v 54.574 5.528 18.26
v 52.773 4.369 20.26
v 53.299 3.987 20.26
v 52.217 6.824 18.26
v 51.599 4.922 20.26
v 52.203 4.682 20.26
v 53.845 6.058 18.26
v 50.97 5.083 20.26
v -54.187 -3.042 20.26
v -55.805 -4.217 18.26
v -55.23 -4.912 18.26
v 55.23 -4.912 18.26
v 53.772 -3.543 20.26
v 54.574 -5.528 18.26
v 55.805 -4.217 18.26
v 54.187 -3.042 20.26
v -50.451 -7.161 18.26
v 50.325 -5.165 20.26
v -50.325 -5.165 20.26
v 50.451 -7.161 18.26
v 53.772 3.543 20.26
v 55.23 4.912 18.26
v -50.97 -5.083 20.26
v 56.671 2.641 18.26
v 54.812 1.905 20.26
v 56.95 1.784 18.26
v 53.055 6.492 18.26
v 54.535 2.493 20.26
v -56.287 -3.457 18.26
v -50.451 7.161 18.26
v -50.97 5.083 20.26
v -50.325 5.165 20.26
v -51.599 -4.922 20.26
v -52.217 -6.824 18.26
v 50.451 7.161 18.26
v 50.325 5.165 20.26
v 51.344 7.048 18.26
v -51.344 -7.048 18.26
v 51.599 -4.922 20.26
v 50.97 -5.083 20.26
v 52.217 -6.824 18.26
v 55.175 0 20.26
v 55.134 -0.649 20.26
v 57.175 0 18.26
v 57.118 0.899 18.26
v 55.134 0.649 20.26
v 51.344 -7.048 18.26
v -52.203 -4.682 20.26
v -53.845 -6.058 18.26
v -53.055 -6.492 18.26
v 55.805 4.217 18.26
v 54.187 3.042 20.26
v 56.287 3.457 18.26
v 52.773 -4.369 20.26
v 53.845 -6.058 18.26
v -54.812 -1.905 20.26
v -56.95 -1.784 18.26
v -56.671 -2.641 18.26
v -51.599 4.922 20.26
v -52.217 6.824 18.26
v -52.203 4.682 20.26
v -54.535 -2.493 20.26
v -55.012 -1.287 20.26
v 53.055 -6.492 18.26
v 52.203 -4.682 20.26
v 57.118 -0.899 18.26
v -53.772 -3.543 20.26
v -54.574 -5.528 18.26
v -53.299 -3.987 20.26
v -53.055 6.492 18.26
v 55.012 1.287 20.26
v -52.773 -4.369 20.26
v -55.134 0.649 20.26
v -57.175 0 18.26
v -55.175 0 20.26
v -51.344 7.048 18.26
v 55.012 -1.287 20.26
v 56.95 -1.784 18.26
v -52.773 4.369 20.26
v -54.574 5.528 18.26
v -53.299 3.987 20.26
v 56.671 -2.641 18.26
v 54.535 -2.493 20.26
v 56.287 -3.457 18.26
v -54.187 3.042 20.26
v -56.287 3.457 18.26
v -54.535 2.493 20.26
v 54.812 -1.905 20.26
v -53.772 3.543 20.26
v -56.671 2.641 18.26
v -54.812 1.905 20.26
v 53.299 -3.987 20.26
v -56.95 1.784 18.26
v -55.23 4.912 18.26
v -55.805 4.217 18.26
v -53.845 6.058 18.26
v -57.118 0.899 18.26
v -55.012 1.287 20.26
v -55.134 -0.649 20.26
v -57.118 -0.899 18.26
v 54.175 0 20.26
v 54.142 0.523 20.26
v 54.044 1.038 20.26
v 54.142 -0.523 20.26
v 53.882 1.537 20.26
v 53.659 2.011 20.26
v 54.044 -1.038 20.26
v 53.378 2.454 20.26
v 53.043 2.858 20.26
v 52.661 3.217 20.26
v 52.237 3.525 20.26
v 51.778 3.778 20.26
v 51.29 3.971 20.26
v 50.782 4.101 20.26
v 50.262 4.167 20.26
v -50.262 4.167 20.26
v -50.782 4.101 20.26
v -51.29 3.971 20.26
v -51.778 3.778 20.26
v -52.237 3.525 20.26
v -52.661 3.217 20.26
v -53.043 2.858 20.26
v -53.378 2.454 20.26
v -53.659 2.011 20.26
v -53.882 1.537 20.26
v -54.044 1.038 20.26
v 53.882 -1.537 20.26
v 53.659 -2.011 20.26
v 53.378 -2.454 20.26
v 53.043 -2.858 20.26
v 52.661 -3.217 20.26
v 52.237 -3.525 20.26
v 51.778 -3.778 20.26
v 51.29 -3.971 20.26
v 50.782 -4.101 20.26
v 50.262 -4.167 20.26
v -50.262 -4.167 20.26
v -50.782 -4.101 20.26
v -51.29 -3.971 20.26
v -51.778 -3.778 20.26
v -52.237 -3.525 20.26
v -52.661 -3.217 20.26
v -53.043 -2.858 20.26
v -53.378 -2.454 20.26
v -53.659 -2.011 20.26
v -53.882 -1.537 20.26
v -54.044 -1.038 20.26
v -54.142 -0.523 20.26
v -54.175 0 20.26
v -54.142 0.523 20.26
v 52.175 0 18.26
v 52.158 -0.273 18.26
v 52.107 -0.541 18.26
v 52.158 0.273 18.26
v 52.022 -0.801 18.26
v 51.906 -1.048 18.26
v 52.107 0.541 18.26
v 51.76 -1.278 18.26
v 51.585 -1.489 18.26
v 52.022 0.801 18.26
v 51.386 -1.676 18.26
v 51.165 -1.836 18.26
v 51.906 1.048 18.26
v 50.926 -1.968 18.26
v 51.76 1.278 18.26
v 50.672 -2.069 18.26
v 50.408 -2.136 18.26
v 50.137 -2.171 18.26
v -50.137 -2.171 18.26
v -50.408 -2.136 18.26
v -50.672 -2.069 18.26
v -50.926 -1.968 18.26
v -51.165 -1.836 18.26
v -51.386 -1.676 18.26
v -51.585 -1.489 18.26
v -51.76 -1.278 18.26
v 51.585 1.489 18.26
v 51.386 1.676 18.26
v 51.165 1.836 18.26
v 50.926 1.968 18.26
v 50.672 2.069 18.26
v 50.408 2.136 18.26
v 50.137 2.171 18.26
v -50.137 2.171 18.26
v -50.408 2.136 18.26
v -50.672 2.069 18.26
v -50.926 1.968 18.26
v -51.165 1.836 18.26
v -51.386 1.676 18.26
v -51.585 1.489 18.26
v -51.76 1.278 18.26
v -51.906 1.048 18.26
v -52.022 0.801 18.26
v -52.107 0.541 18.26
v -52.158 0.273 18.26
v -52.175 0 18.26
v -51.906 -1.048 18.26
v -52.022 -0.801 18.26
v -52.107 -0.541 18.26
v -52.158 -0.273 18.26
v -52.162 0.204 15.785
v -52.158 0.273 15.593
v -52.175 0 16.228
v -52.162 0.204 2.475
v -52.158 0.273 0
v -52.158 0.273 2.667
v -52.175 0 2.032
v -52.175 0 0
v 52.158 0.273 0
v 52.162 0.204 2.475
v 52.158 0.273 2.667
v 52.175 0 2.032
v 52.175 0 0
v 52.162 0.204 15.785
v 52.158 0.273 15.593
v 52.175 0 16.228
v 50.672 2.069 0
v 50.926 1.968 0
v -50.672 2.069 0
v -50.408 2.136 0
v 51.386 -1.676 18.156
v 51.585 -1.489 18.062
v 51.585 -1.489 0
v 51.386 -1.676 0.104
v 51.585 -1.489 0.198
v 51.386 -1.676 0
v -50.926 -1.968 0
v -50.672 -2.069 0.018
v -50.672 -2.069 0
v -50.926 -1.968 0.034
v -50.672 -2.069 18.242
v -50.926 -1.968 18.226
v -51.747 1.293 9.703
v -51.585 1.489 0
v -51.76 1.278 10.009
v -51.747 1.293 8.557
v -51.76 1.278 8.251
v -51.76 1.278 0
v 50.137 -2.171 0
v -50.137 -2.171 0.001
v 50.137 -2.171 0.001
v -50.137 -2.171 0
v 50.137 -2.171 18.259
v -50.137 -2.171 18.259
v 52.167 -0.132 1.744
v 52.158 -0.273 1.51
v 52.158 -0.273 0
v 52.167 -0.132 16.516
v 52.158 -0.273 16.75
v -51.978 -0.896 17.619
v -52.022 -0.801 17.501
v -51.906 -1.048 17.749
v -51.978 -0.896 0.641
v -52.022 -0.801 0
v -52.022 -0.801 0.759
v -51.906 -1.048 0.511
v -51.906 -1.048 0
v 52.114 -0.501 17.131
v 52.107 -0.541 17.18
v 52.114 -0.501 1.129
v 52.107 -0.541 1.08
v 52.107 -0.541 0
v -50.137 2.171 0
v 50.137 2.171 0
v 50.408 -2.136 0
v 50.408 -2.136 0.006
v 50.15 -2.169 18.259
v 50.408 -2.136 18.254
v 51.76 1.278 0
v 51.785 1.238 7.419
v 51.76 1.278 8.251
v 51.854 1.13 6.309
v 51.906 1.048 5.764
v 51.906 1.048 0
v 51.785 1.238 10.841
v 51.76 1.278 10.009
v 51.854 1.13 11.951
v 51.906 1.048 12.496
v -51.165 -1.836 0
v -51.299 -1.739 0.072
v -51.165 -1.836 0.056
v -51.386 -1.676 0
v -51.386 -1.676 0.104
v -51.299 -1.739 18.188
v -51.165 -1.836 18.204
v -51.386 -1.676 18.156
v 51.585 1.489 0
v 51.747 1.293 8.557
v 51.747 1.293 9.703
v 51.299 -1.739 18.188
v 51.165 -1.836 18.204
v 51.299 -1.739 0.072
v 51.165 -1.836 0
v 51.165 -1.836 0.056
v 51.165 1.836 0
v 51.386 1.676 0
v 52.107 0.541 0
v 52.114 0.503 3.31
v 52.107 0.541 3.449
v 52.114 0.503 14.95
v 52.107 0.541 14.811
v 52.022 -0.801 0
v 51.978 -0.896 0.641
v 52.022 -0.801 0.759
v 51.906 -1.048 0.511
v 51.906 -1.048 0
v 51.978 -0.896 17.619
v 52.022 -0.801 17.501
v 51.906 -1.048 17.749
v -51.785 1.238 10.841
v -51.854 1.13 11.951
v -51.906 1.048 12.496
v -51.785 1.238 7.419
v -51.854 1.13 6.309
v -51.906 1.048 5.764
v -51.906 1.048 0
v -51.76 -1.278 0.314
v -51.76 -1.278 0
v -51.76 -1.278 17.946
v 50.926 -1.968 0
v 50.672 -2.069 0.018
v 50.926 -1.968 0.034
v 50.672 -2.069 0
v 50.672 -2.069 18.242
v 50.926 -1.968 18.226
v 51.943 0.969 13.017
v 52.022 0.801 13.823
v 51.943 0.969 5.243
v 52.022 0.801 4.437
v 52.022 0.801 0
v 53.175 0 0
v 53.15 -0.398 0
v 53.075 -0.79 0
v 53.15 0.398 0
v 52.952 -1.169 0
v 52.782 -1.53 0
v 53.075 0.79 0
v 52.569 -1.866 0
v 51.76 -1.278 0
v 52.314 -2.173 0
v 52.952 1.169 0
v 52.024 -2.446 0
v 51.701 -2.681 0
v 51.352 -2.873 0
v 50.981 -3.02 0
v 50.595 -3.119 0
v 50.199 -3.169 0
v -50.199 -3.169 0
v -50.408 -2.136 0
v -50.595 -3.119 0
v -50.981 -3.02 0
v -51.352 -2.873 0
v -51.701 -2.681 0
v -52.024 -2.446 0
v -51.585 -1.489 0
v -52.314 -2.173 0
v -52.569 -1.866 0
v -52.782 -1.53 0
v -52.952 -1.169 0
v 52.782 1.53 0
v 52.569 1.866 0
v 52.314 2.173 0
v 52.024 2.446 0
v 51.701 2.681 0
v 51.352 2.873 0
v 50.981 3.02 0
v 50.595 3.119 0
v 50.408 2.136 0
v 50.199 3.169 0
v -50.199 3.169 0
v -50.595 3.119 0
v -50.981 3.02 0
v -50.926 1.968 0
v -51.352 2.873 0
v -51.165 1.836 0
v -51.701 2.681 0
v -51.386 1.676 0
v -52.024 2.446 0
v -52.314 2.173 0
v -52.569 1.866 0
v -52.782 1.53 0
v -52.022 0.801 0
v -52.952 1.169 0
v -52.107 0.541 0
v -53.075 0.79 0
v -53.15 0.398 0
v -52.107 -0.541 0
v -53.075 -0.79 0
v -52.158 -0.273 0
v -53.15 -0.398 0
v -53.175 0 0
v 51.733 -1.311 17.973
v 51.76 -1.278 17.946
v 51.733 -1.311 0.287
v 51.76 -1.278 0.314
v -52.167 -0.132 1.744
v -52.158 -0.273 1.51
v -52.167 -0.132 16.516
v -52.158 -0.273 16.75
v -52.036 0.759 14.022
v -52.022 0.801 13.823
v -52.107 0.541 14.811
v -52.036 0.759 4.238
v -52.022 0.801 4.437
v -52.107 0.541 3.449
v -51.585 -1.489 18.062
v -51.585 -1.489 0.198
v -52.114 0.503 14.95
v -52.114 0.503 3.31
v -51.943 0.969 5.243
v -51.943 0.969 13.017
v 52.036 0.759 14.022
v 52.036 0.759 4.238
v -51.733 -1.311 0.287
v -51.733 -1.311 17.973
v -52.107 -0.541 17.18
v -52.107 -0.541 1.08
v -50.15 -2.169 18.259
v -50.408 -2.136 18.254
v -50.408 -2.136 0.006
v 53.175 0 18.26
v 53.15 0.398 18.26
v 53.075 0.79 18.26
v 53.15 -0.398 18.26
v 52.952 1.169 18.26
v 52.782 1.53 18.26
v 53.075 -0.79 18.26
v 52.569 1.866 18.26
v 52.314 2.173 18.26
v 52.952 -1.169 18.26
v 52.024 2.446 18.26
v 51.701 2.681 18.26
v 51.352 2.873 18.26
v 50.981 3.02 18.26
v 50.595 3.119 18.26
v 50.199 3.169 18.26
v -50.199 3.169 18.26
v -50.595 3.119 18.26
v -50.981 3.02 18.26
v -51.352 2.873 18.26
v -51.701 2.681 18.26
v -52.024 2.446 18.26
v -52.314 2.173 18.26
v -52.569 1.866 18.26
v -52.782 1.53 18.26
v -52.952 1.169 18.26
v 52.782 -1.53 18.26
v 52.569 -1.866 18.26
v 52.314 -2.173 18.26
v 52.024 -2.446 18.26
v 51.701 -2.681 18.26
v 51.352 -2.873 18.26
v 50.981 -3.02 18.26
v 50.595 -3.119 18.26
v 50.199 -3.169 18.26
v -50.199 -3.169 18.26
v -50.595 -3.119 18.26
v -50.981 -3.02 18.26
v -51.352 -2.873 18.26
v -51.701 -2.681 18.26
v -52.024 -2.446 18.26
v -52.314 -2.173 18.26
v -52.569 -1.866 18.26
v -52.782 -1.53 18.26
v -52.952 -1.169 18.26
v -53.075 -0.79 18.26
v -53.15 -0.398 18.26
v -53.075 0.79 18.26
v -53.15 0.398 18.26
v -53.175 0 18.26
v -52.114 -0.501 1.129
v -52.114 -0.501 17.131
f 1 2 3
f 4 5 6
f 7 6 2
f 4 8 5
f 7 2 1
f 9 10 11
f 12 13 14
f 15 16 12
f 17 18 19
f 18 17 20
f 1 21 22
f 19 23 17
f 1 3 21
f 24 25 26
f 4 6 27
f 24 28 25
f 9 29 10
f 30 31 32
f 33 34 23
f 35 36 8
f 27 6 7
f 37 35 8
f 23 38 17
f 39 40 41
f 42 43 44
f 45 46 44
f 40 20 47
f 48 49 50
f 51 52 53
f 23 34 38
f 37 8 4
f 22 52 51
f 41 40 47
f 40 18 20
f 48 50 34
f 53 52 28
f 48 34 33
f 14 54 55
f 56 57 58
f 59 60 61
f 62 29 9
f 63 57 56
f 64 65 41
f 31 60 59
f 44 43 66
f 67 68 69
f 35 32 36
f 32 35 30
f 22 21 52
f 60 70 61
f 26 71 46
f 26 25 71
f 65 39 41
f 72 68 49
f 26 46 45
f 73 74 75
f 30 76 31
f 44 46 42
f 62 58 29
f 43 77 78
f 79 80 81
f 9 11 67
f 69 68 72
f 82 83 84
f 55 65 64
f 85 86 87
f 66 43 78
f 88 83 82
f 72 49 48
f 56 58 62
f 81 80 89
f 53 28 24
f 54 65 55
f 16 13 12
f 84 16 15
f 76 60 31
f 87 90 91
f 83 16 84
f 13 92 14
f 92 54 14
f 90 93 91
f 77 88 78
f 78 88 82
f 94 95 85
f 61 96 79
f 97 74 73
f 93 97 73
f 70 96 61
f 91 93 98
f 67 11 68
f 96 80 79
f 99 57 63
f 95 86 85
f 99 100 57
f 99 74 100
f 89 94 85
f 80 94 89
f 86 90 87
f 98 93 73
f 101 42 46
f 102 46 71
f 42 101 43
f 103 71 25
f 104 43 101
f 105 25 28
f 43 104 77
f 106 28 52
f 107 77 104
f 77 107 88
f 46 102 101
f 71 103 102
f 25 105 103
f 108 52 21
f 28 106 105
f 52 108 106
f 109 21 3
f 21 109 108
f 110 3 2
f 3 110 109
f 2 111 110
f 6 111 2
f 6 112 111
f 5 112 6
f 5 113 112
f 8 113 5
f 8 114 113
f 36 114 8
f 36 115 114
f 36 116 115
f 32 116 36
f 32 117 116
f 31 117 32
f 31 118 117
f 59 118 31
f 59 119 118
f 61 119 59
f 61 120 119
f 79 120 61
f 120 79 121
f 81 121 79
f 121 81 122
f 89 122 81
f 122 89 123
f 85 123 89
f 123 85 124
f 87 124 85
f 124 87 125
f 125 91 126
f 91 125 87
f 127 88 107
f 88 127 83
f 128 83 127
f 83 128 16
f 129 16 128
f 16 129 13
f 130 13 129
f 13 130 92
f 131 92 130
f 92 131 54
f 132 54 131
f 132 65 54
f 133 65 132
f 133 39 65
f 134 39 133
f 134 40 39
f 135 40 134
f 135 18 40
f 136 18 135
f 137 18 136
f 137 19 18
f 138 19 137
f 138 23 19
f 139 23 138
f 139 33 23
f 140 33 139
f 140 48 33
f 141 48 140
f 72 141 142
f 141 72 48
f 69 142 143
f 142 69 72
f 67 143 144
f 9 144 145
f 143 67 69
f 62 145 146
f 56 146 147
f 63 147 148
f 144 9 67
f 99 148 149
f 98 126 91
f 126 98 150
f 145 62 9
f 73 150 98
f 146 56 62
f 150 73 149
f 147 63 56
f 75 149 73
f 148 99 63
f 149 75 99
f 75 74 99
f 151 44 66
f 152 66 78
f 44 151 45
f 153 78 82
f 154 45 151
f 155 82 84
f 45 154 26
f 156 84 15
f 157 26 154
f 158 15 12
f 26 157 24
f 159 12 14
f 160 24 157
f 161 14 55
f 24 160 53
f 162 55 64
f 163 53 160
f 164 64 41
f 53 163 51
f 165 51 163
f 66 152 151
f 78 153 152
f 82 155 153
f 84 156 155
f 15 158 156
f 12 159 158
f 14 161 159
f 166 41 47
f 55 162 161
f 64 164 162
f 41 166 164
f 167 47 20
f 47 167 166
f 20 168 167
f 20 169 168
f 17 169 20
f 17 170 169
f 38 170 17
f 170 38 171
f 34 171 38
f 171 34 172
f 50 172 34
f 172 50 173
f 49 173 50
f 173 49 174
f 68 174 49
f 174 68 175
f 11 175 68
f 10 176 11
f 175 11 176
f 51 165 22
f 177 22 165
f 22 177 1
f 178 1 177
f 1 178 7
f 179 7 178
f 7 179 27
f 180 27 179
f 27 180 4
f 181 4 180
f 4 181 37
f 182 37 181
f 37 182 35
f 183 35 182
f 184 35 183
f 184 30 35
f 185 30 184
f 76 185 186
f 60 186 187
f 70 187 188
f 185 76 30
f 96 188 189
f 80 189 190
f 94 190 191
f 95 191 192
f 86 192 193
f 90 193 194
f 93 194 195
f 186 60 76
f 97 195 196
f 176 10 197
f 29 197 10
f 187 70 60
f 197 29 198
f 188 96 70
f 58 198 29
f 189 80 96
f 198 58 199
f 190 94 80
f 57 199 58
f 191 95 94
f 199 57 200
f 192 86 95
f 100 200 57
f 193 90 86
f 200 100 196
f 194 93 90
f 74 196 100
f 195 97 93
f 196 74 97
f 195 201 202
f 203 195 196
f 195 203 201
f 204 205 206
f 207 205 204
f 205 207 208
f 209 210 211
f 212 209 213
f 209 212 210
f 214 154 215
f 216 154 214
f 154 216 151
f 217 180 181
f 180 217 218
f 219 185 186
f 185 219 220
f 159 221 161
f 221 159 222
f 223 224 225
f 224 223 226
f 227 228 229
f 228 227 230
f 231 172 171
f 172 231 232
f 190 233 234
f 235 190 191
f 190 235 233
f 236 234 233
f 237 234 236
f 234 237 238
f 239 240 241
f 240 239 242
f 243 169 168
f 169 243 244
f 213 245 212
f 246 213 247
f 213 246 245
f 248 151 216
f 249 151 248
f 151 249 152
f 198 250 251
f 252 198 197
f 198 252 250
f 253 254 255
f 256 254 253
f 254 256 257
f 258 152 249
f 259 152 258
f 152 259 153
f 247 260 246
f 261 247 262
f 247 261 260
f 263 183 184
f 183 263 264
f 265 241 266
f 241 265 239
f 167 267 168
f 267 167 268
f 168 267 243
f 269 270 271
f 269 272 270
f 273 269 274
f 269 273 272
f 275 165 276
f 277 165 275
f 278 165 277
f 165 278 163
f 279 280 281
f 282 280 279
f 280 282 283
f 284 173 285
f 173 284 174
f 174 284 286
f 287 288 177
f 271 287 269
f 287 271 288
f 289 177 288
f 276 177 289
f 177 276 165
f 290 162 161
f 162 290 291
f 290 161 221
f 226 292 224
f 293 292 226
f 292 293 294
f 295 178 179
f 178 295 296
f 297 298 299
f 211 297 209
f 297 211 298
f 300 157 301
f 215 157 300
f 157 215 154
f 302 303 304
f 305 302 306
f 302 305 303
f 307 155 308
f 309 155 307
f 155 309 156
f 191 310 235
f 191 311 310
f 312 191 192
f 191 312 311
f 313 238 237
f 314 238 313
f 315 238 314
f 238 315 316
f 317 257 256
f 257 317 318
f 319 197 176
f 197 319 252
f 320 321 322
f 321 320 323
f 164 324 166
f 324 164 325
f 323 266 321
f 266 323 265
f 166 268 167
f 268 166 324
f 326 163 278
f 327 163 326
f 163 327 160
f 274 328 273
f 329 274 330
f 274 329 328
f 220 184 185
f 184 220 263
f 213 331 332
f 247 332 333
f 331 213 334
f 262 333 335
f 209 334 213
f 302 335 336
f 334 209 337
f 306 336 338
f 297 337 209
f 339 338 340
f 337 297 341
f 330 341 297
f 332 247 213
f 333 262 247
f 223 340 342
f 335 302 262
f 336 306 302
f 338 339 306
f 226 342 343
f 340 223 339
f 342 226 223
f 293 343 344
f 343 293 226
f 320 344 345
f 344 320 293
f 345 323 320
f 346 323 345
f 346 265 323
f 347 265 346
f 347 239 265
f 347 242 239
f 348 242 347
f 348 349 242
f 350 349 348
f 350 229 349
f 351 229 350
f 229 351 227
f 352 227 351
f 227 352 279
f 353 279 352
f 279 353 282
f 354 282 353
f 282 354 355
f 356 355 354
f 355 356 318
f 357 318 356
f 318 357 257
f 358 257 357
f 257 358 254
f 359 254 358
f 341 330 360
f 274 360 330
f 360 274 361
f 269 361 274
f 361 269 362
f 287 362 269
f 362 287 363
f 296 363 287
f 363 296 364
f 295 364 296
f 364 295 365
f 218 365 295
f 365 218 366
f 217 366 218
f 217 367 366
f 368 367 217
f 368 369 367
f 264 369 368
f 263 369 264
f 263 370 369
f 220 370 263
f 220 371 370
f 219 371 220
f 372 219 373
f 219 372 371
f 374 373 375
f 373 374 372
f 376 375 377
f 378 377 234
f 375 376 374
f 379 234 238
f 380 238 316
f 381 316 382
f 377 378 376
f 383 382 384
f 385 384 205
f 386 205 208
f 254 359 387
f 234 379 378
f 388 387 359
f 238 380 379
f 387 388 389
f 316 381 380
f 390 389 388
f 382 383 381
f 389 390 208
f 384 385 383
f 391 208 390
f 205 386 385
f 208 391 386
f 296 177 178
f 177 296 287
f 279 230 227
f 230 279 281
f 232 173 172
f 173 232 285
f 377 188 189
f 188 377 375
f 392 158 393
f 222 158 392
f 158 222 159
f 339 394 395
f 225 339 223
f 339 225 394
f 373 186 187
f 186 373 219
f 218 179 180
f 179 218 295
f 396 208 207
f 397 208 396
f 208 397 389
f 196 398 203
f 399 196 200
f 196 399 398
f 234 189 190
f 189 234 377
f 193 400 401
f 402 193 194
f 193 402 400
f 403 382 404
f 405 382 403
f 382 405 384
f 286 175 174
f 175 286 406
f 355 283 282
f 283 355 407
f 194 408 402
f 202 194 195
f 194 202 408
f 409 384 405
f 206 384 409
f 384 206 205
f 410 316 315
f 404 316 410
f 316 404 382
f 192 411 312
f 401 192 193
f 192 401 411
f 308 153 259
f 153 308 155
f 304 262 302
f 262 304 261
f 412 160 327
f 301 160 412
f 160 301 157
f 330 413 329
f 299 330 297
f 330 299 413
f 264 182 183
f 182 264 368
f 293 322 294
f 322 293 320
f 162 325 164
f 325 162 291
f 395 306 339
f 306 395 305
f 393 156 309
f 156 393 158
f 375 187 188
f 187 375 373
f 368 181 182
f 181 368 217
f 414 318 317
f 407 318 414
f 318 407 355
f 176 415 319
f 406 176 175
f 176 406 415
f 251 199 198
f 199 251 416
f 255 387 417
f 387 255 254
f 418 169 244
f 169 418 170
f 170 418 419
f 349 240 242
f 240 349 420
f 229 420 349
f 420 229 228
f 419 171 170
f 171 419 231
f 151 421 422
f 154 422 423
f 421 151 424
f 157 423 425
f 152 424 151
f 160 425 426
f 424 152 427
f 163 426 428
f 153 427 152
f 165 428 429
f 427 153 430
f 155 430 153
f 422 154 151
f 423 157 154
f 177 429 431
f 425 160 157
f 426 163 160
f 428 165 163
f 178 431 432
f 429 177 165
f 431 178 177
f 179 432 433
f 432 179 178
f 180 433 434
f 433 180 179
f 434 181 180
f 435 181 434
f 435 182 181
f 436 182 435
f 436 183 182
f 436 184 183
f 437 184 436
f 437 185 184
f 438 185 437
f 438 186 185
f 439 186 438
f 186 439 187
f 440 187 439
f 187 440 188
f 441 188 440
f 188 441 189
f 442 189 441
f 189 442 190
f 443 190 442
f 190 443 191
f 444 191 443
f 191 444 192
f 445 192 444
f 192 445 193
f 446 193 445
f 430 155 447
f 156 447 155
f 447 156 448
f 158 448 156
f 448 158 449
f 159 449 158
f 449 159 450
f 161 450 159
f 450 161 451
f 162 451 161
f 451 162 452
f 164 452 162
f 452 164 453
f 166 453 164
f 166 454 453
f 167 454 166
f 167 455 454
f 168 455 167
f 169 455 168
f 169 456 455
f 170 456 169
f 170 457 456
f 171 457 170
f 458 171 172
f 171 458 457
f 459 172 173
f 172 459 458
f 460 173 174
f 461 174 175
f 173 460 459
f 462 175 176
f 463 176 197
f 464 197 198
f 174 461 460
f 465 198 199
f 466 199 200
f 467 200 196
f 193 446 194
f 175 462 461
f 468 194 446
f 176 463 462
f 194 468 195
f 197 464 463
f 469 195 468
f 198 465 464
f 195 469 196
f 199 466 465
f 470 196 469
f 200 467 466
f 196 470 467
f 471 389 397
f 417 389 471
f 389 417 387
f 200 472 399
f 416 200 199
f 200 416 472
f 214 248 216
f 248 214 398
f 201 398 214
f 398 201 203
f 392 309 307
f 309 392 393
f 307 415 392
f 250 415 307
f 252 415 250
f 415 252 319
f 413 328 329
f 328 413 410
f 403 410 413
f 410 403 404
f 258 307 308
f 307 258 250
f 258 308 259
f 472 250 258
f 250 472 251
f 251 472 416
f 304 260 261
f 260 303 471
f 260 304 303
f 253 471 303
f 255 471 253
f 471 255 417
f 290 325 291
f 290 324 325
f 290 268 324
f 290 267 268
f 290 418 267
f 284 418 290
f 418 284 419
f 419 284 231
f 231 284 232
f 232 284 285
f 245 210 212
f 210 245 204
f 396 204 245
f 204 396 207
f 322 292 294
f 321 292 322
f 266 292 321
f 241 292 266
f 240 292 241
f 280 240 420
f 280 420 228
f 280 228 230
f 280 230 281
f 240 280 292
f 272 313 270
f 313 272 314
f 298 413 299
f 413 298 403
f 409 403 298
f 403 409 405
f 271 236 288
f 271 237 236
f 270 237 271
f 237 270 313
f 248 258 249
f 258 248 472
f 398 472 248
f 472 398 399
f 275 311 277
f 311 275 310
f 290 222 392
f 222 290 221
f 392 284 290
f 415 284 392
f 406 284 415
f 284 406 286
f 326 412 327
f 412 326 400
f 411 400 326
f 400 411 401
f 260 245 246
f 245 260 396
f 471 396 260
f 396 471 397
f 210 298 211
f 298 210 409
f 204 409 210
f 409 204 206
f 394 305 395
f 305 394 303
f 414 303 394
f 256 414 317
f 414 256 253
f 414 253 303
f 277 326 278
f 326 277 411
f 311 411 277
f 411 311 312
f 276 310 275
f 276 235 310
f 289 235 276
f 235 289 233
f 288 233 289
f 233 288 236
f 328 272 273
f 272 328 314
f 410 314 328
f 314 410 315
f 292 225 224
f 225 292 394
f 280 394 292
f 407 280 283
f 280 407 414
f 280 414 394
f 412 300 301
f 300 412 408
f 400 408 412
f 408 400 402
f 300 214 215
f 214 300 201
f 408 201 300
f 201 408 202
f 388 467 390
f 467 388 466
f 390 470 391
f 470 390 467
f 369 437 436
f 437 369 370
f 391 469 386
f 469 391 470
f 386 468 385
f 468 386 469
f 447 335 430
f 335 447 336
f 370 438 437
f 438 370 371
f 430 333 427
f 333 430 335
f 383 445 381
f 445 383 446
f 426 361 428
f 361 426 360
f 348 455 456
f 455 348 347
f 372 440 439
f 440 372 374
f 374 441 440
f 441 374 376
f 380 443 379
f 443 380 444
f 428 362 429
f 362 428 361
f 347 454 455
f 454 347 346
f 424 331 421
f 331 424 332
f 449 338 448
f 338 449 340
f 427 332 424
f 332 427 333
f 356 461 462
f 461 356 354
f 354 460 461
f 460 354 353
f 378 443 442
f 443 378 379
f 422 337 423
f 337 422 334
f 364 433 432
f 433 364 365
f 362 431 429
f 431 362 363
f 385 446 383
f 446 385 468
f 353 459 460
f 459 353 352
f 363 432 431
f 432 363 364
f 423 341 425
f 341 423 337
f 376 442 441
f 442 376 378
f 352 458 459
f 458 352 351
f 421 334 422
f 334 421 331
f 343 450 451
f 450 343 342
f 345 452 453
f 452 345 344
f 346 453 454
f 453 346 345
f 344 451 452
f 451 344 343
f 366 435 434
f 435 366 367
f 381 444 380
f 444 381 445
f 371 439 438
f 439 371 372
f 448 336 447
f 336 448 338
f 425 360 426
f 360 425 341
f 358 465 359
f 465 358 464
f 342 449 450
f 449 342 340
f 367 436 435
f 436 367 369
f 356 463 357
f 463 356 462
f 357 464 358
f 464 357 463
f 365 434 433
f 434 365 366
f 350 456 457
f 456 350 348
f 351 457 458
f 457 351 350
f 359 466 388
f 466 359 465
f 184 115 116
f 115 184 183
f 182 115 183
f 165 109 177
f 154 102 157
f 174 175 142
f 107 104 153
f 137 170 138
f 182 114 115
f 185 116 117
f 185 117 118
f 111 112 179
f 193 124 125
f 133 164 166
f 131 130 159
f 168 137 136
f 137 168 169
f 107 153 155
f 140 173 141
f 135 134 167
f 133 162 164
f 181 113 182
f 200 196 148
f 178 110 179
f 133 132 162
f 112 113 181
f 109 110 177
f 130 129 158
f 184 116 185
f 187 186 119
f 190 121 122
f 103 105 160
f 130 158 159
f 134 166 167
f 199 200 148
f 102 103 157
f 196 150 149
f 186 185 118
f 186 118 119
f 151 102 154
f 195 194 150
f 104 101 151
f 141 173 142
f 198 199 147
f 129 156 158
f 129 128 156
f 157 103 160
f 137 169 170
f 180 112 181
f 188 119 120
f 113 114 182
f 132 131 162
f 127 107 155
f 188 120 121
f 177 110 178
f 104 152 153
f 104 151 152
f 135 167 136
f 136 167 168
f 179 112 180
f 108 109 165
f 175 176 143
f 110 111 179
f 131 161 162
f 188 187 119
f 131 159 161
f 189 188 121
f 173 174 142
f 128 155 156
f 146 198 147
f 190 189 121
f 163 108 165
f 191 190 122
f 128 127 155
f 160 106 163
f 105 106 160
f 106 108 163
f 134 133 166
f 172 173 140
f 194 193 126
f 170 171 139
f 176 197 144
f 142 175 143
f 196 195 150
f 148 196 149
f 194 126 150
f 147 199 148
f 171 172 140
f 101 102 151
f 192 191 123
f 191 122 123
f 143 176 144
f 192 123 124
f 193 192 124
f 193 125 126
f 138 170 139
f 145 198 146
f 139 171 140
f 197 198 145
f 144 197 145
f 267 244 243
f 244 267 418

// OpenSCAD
/* [Size] */
// All units in millimeters

Width = 100; // [10:10:500]
Height = 18.26; // [1:0.01:100]
Slot_Depth = 6.35; // [2:0.05:20]
Filament_Size = 1.75; // [1.75: 1.75mm, 3: 3mm]
Lip_Height = 2; // [1:1:10]
Grommet_Wall_Thickness = 1; // [1:1:10]

module __end_customizer_options__() { }

// Constants //

$fn = $preview ? 10 : 50;

// Modules //

module slot_shape(radius, width) {
    hull()
    for(m = [0:1]) {
        mirror([m, 0])
        translate([-Width/2, 0])
        circle(radius);
    }
}

module hull_stack(height, mirr=false, cut=false) {
    // Takes two children
    // Set the first child as the larger polygon
    slop = 0.001;
    translate([0, 0, mirr ? height : 0])
    mirror([0, 0, mirr ? 1 : 0])
    difference() {
        hull() 
        union() {
            translate([0, 0, -slop])
            linear_extrude(height=slop)
            children(0);

            translate([0, 0, height - slop])
            linear_extrude(height=slop)
            children(1);
        }
        if (!cut) {
            translate([0, 0, -slop])
            linear_extrude(height=slop)
            children(0);
        }
    }
    if (cut) {
        translate([0, 0, -slop])
        linear_extrude(height=slop)
        children(1);
    }
}

module grommet_interior_cut(top_radius, width, height) {
    curve_sz = top_radius * 2 - Filament_Size / 2;

    difference() {
        linear_extrude(height=height)
        slot_shape(top_radius, width);

        translate([-(width + top_radius * 2) / 2, -top_radius, height / 2])
        rotate([0, 90, 0])
        linear_extrude(height=width + top_radius * 2)
        scale([height / 2 / curve_sz, 1])
        circle(curve_sz);
    }
}


module part() {
    slot_top_radius = Slot_Depth / 2 - Grommet_Wall_Thickness;
    grommet_interior_cut(slot_top_radius, Width, Height);
}

module grommet() {
    ht = Lip_Height;
    fs = Filament_Size * 1.3;
    slot_top_radius = Slot_Depth / 2 - Grommet_Wall_Thickness;
    echo(Filament_Size, ht, slot_top_radius);

    difference() {
        union() {
            translate([0, 0, Height])
            hull_stack(ht, mirr=false) {
                slot_shape(Slot_Depth / 2 + ht * 2, Width);
                slot_shape(Slot_Depth / 2 + ht, Width);
            }
            difference() {
                linear_extrude(height=Height)
                slot_shape(Slot_Depth/2, Width);
                grommet_interior_cut(slot_top_radius, Width, Height);
            }
        }
        translate([0, 0, Height])
        hull_stack(ht, mirr=true, cut=true) {
            slot_shape(slot_top_radius + ht, Width);
            slot_shape(slot_top_radius, Width);
        }
    }
}

module main() {
    grommet();
    // part();
}

color("skyblue", 0.5)
main();
